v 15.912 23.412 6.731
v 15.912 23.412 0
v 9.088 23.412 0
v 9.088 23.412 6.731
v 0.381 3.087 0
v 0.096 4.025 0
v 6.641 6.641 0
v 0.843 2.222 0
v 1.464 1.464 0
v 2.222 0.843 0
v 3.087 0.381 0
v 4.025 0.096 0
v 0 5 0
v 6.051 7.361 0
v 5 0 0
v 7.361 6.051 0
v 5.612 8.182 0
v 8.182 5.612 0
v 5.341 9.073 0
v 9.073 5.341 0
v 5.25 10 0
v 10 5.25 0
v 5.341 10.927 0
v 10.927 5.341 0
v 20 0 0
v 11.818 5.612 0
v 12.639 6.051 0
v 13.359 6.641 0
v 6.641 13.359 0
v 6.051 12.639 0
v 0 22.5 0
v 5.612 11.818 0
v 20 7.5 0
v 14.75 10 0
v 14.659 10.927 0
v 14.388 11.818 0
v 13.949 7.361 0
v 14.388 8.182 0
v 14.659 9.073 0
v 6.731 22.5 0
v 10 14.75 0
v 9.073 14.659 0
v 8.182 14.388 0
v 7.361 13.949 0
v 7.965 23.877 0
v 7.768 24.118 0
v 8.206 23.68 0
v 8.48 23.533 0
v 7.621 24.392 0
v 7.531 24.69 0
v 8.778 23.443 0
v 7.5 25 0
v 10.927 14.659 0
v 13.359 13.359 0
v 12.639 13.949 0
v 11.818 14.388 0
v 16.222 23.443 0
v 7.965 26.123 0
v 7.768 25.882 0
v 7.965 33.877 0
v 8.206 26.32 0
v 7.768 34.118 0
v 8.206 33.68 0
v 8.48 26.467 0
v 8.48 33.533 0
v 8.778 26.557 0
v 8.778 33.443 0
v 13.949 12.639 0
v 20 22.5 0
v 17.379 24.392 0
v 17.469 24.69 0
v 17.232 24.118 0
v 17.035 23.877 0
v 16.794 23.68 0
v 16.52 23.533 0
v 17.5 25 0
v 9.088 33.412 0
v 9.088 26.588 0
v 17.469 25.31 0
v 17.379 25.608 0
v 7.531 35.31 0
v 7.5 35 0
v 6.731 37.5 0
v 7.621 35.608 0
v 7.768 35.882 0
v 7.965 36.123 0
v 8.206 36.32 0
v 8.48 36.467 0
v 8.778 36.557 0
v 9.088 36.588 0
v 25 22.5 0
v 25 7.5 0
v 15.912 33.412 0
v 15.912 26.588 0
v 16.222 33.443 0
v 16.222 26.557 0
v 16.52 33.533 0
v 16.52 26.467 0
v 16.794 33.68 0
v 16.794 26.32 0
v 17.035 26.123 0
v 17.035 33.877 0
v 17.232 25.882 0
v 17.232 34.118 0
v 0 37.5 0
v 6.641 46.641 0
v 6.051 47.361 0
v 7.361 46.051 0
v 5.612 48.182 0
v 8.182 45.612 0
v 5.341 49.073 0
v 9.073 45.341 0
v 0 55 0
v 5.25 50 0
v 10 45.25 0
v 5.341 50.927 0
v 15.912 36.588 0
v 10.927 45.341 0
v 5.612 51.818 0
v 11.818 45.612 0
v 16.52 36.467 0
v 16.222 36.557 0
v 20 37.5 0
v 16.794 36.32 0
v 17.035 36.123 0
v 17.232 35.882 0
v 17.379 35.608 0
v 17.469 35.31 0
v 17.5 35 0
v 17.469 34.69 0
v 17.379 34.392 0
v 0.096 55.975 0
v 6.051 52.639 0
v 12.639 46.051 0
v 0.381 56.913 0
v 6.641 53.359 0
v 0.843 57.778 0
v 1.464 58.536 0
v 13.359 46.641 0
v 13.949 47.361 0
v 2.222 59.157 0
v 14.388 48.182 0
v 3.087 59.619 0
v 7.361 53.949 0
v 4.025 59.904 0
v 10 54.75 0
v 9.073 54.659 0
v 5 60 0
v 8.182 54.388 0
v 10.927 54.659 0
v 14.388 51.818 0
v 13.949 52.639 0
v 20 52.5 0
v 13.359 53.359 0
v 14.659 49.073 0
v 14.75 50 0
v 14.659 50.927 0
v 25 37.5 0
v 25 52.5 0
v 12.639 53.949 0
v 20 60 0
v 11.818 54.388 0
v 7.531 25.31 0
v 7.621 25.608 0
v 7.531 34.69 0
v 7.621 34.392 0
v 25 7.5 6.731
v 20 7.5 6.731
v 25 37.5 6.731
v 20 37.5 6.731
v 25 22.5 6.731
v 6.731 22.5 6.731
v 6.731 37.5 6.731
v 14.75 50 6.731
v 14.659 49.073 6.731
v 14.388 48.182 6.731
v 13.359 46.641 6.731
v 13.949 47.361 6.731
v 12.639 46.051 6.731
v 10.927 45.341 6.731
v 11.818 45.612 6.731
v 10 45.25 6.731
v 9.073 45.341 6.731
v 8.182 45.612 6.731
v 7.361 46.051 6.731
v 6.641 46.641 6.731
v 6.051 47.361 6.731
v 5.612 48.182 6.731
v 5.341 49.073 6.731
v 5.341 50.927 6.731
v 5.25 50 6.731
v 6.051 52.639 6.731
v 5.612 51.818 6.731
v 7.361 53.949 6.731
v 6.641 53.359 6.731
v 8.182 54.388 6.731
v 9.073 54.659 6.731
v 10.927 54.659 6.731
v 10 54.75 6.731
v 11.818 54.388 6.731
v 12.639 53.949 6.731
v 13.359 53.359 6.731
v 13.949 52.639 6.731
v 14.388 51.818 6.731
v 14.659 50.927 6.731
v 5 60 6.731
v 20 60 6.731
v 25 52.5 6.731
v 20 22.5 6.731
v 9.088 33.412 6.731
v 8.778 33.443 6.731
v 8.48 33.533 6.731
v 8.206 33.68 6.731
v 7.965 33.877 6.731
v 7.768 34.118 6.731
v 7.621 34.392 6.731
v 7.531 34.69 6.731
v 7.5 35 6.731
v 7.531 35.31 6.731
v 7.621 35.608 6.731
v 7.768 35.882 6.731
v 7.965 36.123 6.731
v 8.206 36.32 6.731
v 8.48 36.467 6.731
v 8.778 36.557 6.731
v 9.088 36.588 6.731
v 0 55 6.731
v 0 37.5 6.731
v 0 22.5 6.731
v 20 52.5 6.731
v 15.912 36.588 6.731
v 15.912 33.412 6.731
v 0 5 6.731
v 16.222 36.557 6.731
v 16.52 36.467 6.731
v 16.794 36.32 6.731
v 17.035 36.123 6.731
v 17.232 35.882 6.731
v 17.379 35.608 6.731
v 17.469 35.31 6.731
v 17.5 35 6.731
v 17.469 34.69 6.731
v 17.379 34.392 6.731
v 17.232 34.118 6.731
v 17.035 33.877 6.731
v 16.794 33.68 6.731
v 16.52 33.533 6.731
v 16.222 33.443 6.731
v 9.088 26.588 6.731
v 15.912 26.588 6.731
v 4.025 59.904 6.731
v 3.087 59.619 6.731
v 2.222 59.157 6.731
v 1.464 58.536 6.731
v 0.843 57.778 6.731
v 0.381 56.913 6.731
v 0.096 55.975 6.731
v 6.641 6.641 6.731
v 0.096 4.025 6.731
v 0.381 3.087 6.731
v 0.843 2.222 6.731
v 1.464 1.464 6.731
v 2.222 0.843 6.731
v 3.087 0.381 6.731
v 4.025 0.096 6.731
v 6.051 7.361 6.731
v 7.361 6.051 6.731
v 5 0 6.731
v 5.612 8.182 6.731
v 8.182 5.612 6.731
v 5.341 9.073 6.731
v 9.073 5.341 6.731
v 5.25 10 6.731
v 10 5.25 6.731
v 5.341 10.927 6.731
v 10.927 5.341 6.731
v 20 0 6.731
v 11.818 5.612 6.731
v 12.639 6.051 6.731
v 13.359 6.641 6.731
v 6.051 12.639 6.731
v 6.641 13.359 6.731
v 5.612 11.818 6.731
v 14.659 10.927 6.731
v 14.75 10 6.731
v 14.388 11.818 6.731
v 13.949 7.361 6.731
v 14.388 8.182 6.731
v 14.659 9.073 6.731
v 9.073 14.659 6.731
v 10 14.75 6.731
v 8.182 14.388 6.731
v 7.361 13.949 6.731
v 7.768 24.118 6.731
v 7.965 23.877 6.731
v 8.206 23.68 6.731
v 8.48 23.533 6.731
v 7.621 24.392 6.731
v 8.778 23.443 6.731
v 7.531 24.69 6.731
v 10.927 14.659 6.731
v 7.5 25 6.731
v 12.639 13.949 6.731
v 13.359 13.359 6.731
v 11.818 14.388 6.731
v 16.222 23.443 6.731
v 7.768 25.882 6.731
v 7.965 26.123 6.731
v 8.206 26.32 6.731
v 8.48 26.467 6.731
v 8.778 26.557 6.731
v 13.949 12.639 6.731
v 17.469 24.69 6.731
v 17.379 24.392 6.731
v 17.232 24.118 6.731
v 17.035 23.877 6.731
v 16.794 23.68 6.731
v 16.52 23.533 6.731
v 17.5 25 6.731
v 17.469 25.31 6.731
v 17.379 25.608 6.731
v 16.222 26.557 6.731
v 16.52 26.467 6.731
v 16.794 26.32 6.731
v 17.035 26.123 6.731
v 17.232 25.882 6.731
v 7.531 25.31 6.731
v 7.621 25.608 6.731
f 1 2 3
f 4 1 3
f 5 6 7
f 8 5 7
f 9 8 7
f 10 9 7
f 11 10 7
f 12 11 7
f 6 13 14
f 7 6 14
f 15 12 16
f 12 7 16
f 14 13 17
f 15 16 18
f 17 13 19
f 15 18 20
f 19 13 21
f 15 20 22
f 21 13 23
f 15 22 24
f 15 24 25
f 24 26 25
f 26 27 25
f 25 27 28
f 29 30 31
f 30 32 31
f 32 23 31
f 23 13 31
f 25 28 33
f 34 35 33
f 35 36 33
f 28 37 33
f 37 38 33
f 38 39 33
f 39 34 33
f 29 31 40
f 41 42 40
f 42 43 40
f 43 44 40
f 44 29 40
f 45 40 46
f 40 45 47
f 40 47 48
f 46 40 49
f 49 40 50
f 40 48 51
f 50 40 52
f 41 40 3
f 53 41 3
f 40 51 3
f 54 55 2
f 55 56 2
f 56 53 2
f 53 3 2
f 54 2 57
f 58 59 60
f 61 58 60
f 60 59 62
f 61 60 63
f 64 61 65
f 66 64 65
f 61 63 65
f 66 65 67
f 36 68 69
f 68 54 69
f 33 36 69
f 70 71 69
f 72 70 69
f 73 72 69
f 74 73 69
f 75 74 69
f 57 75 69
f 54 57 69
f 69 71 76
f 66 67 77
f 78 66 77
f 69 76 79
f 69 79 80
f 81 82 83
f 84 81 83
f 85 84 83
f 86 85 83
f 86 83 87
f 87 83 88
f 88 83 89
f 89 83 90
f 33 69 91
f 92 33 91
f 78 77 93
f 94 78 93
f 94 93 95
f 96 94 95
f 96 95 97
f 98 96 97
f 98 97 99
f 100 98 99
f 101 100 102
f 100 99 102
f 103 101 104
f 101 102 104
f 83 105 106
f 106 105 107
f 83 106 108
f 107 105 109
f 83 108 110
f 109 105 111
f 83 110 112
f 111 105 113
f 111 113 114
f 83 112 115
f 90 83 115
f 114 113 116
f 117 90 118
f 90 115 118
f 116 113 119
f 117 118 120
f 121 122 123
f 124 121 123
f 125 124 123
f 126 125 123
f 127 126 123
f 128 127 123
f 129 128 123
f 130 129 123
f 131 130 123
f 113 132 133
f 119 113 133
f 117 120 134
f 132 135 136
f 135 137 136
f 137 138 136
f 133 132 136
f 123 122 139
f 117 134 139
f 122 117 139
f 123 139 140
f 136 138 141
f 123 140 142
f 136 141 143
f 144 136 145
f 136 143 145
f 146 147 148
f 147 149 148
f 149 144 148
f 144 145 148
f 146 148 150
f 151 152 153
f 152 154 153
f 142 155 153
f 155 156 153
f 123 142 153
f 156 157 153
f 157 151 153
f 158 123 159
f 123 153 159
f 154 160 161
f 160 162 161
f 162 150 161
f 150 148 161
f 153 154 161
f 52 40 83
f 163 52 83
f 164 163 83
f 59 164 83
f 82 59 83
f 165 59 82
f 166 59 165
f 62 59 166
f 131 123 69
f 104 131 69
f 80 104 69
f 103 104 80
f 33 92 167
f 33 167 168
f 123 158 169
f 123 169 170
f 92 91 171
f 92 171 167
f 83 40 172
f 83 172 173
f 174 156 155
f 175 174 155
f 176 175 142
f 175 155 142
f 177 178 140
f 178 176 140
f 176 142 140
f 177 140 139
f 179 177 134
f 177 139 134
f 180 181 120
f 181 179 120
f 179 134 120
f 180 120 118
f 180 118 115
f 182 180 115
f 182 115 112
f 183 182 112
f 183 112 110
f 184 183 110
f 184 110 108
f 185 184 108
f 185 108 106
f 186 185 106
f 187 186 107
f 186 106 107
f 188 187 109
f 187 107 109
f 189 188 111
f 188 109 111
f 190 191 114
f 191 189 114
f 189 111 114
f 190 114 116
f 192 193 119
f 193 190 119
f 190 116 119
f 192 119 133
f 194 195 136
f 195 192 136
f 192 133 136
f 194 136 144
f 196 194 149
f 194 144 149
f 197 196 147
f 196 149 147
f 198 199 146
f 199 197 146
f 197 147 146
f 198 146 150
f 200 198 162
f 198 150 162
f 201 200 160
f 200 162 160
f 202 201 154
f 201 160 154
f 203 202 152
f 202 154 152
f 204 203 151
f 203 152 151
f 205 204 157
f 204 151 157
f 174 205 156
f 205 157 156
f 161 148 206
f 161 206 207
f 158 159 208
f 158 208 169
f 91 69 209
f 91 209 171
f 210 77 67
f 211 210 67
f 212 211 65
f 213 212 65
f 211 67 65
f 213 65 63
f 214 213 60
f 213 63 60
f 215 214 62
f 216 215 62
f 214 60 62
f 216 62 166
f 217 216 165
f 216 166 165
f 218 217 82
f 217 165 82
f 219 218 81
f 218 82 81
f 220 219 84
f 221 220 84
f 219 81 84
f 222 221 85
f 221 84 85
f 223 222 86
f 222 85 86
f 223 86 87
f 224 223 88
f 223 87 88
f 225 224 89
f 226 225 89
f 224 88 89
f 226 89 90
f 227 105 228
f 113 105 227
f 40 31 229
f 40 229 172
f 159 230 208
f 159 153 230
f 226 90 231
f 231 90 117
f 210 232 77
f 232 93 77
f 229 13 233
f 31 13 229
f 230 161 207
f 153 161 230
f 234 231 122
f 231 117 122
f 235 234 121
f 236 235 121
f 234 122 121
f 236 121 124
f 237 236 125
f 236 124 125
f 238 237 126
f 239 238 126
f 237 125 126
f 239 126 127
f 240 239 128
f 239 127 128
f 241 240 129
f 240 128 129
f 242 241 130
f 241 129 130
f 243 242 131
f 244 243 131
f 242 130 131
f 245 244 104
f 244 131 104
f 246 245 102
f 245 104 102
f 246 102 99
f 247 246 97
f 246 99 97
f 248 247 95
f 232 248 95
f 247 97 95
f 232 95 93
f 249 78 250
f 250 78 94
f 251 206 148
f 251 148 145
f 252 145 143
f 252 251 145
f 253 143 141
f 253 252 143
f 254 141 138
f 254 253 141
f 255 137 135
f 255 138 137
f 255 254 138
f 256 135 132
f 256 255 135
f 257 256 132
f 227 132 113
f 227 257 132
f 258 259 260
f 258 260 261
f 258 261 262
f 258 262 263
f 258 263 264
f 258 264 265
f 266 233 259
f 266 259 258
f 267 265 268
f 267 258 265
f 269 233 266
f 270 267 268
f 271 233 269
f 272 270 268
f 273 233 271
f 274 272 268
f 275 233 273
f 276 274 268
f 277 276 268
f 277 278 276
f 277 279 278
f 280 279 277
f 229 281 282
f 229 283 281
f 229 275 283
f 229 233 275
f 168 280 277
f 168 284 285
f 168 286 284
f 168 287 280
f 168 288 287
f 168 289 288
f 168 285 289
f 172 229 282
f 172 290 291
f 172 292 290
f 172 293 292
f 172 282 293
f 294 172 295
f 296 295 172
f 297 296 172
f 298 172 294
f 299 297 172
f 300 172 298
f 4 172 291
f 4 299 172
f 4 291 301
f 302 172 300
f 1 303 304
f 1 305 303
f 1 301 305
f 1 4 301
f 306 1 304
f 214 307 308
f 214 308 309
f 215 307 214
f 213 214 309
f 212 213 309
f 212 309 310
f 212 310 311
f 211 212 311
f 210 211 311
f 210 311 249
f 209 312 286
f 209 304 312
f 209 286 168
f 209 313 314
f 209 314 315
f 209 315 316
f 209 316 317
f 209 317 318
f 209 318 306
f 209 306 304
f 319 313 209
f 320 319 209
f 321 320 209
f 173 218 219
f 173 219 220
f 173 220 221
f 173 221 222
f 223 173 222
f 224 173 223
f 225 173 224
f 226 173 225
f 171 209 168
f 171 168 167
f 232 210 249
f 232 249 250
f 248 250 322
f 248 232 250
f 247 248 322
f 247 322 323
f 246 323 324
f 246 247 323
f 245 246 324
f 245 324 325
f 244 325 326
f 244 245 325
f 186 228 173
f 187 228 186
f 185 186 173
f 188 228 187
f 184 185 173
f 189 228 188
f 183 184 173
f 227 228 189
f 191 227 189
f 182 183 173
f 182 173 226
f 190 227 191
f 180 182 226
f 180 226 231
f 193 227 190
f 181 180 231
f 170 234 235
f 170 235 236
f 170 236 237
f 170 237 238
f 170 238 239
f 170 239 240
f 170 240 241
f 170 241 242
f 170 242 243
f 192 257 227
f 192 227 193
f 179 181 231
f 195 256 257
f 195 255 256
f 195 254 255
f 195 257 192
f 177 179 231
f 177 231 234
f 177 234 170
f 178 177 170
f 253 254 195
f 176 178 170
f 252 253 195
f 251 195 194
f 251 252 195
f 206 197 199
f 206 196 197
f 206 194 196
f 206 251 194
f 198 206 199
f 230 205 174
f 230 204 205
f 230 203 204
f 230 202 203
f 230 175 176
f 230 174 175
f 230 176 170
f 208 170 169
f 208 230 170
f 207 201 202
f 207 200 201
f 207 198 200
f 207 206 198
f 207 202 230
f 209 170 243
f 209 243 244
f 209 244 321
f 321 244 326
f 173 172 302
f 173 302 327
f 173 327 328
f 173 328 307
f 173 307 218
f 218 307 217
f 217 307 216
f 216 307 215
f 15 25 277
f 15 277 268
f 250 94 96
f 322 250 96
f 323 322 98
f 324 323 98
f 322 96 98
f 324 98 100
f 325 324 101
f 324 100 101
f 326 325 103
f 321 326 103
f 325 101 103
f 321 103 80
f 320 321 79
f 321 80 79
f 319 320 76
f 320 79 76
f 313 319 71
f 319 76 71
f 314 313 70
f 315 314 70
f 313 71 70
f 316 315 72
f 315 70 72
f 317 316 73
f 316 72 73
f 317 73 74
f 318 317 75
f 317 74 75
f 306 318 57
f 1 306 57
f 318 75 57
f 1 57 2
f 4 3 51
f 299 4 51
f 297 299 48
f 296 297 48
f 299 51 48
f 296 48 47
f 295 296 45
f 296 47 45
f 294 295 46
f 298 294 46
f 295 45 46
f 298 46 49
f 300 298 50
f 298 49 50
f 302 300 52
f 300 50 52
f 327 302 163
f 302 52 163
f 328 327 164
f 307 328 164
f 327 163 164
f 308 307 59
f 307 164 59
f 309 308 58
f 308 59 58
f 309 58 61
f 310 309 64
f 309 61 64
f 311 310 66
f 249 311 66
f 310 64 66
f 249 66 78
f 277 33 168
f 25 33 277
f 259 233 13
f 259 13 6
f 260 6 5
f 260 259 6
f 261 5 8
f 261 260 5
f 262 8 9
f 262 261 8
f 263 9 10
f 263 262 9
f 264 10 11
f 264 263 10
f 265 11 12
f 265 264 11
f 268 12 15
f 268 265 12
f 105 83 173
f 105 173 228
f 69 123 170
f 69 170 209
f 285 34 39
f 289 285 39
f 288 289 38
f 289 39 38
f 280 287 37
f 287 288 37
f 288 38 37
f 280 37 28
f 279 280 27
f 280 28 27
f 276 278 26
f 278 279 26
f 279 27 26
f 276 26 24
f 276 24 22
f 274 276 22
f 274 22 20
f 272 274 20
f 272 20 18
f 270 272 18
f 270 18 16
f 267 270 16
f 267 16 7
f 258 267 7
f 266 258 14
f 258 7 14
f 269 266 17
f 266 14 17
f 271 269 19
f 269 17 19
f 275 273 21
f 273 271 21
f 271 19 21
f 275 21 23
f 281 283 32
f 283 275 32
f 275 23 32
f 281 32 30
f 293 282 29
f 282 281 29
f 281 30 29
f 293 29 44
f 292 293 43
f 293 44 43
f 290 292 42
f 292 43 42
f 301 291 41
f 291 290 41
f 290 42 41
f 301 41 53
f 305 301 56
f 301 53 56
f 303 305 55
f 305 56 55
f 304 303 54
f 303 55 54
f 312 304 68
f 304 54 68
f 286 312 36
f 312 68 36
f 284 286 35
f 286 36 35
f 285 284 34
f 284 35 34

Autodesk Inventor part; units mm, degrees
ref_plane "YZ Plane" through (0, 0, 0) normal (1, 0, 0) x (0, 1, 0)
ref_plane "XZ Plane" through (0, 0, 0) normal (0, 1, 0) x (-1, 0, 0)
ref_plane "XY Plane" through (0, 0, 0) normal (0, 0, 1) x (1, 0, 0)
sketch "Sketch1" plane through (0, 0, 0) normal (0, 0, 1) x (1, 0, 0)
  line L0 (0, 0) -> (0, 60)
  line L1 (0, 60) -> (20, 60)
  line L2 (20, 60) -> (20, 52.5)
  line L3 (20, 52.5) -> (25, 52.5)
  line L4 (25, 52.5) -> (25, 37.5)
  line L5 (25, 37.5) -> (20, 37.5)
  line L6 (20, 37.5) -> (20, 22.5)
  line L7 (20, 22.5) -> (25, 22.5)
  line L8 (25, 22.5) -> (25, 7.5)
  line L9 (25, 7.5) -> (20, 7.5)
  line L10 (20, 7.5) -> (20, 0)
  line L11 (20, 0) -> (0, 0)
  circle A0 centre (10, 10) radius 4.75
  circle A1 centre (10, 50) radius 4.75
  circle A2 centre (5, 41.25) radius 1.59
  circle A3 centre (12.5, 30) radius 1.59
  line L12 (7.5, 36.5875) -> (17.5, 36.5875)
  line L13 (17.5, 36.5875) -> (17.5, 33.4125)
  line L14 (17.5, 33.4125) -> (7.5, 33.4125)
  line L15 (7.5, 33.4125) -> (7.5, 36.5875)
  line L16 (7.5, 26.5875) -> (17.5, 26.5875)
  line L17 (17.5, 26.5875) -> (17.5, 23.4125)
  line L18 (17.5, 23.4125) -> (7.5, 23.4125)
  line L19 (7.5, 23.4125) -> (7.5, 26.5875)
  line L20 (9.0875, 35) -> (15.9125, 35) construction
  line L21 (9.0875, 33.4125) -> (15.9125, 33.4125)
  line L22 (15.9125, 36.5875) -> (9.0875, 36.5875)
  arc A4 (9.0875, 36.5875) -> (9.0875, 33.4125) centre (9.0875, 35) ccw
  arc A5 (15.9125, 33.4125) -> (15.9125, 36.5875) centre (15.9125, 35) ccw
  line L23 (9.0875, 25) -> (15.9125, 25) construction
  line L24 (9.0875, 23.4125) -> (15.9125, 23.4125)
  line L25 (15.9125, 26.5875) -> (9.0875, 26.5875)
  arc A6 (9.0875, 26.5875) -> (9.0875, 23.4125) centre (9.0875, 25) ccw
  arc A7 (15.9125, 23.4125) -> (15.9125, 26.5875) centre (15.9125, 25) ccw
  point P0 (12.5, 35)
  point P1 (12.5, 25)
  point P2 (20, 30)
  dimension "d0" = 15
  dimension "d1" = 60
  dimension "d2" = 20
  dimension "d3" = 5
  dimension "d6" = 9.5
  dimension "d7" = 40
  dimension "d8" = 10
  dimension "d9" = 10
  dimension "d11" = 10
  dimension "d12" = 10
  dimension "d25" = 3.18
  dimension "d26" = 15
  dimension "d29" = 2.5
  dimension "d30" = 3.175
  dimension "d33" = 10
  dimension "d34" = 10
  dimension "d35" = 5
  dimension "d36" = 7.5
  dimension "d37" = 11.25
extrude "Extrusion1" add sketch "Sketch1" along normal blind 6.731 contours L0 L1 L2 L3 L4 L5 L6 L7 L8 L9 L10 L11 | A2 | A3 | L12 A4 L15 | L12 A5 L14 A4 | A4 L14 L15 | L12 L13 A5 | L13 L14 A5 | L16 A6 L19 | L16 A7 L18 A6 | A6 L18 L19 | L16 L17 A7 | L17 L18 A7
sketch "Sketch2" plane through (0, 0, 0) normal (0, 0, -1) x (-1, 0, 0)
  line L0 (0, 0) -> (-20, 0) projected
  line L1 (0, 60) -> (0, 0) projected
  line L2 (-20, 22.5) -> (-20, 37.5) projected
  line L3 (0, 22.5) -> (-6.731, 22.5)
  line L4 (-6.731, 22.5) -> (-6.731, 37.5)
  line L5 (-6.731, 37.5) -> (0, 37.5)
  line L6 (0, 37.5) -> (0, 22.5)
  line L7 (-9.0875, 25) -> (-15.9125, 25) construction
  line L8 (-9.0875, 26.5875) -> (-15.9125, 26.5875)
  line L9 (-15.9125, 23.4125) -> (-9.0875, 23.4125)
  arc A0 (-9.0875, 23.4125) -> (-9.0875, 26.5875) centre (-9.0875, 25) ccw
  arc A1 (-15.9125, 26.5875) -> (-15.9125, 23.4125) centre (-15.9125, 25) ccw
  line L10 (-9.0875, 35) -> (-15.9125, 35) construction
  line L11 (-9.0875, 36.5875) -> (-15.9125, 36.5875)
  line L12 (-15.9125, 33.4125) -> (-9.0875, 33.4125)
  arc A2 (-9.0875, 33.4125) -> (-9.0875, 36.5875) centre (-9.0875, 35) ccw
  arc A3 (-15.9125, 36.5875) -> (-15.9125, 33.4125) centre (-15.9125, 35) ccw
  point P0 (0, 30)
  point P1 (0, 30)
  point P2 (-12.5, 25)
  point P3 (-12.5, 35)
  dimension "d38" = 6.731
  dimension "d39" = 15
  dimension "d40" = 10
  dimension "d41" = 3.175
  dimension "d42" = 6.825
  dimension "d43" = 2.5
  dimension "d44" = 5
extrude "Extrusion2" cut sketch "Sketch2" against normal up to next
fillet "Fillet1" radius 5 2 edges at (0, 60, 3.3655) (0, 0, 3.3655)
equation "\"d6\" = MAGDIA"
equation "\"d8\" = d9"
equation "\"d11\" = d12"
equation "\"d35\" = 0.5 * d34"
equation "\"d4\" = THICKB"
equation "\"d38\" = THICKB"
equation "\"d44\" = 0.5 * d40"
equation "\"THICKA\" = 3.175"
equation "\"THICKB\" = 6.731"
equation "\"THICKC\" = 12.7"
equation "\"MAGDIA\" = 9.5"
equation "\"BALLDIA\" = 12"
equation "\"THICKPLY\" = 5"
properties part number "Carriage_Joint_Frame"
